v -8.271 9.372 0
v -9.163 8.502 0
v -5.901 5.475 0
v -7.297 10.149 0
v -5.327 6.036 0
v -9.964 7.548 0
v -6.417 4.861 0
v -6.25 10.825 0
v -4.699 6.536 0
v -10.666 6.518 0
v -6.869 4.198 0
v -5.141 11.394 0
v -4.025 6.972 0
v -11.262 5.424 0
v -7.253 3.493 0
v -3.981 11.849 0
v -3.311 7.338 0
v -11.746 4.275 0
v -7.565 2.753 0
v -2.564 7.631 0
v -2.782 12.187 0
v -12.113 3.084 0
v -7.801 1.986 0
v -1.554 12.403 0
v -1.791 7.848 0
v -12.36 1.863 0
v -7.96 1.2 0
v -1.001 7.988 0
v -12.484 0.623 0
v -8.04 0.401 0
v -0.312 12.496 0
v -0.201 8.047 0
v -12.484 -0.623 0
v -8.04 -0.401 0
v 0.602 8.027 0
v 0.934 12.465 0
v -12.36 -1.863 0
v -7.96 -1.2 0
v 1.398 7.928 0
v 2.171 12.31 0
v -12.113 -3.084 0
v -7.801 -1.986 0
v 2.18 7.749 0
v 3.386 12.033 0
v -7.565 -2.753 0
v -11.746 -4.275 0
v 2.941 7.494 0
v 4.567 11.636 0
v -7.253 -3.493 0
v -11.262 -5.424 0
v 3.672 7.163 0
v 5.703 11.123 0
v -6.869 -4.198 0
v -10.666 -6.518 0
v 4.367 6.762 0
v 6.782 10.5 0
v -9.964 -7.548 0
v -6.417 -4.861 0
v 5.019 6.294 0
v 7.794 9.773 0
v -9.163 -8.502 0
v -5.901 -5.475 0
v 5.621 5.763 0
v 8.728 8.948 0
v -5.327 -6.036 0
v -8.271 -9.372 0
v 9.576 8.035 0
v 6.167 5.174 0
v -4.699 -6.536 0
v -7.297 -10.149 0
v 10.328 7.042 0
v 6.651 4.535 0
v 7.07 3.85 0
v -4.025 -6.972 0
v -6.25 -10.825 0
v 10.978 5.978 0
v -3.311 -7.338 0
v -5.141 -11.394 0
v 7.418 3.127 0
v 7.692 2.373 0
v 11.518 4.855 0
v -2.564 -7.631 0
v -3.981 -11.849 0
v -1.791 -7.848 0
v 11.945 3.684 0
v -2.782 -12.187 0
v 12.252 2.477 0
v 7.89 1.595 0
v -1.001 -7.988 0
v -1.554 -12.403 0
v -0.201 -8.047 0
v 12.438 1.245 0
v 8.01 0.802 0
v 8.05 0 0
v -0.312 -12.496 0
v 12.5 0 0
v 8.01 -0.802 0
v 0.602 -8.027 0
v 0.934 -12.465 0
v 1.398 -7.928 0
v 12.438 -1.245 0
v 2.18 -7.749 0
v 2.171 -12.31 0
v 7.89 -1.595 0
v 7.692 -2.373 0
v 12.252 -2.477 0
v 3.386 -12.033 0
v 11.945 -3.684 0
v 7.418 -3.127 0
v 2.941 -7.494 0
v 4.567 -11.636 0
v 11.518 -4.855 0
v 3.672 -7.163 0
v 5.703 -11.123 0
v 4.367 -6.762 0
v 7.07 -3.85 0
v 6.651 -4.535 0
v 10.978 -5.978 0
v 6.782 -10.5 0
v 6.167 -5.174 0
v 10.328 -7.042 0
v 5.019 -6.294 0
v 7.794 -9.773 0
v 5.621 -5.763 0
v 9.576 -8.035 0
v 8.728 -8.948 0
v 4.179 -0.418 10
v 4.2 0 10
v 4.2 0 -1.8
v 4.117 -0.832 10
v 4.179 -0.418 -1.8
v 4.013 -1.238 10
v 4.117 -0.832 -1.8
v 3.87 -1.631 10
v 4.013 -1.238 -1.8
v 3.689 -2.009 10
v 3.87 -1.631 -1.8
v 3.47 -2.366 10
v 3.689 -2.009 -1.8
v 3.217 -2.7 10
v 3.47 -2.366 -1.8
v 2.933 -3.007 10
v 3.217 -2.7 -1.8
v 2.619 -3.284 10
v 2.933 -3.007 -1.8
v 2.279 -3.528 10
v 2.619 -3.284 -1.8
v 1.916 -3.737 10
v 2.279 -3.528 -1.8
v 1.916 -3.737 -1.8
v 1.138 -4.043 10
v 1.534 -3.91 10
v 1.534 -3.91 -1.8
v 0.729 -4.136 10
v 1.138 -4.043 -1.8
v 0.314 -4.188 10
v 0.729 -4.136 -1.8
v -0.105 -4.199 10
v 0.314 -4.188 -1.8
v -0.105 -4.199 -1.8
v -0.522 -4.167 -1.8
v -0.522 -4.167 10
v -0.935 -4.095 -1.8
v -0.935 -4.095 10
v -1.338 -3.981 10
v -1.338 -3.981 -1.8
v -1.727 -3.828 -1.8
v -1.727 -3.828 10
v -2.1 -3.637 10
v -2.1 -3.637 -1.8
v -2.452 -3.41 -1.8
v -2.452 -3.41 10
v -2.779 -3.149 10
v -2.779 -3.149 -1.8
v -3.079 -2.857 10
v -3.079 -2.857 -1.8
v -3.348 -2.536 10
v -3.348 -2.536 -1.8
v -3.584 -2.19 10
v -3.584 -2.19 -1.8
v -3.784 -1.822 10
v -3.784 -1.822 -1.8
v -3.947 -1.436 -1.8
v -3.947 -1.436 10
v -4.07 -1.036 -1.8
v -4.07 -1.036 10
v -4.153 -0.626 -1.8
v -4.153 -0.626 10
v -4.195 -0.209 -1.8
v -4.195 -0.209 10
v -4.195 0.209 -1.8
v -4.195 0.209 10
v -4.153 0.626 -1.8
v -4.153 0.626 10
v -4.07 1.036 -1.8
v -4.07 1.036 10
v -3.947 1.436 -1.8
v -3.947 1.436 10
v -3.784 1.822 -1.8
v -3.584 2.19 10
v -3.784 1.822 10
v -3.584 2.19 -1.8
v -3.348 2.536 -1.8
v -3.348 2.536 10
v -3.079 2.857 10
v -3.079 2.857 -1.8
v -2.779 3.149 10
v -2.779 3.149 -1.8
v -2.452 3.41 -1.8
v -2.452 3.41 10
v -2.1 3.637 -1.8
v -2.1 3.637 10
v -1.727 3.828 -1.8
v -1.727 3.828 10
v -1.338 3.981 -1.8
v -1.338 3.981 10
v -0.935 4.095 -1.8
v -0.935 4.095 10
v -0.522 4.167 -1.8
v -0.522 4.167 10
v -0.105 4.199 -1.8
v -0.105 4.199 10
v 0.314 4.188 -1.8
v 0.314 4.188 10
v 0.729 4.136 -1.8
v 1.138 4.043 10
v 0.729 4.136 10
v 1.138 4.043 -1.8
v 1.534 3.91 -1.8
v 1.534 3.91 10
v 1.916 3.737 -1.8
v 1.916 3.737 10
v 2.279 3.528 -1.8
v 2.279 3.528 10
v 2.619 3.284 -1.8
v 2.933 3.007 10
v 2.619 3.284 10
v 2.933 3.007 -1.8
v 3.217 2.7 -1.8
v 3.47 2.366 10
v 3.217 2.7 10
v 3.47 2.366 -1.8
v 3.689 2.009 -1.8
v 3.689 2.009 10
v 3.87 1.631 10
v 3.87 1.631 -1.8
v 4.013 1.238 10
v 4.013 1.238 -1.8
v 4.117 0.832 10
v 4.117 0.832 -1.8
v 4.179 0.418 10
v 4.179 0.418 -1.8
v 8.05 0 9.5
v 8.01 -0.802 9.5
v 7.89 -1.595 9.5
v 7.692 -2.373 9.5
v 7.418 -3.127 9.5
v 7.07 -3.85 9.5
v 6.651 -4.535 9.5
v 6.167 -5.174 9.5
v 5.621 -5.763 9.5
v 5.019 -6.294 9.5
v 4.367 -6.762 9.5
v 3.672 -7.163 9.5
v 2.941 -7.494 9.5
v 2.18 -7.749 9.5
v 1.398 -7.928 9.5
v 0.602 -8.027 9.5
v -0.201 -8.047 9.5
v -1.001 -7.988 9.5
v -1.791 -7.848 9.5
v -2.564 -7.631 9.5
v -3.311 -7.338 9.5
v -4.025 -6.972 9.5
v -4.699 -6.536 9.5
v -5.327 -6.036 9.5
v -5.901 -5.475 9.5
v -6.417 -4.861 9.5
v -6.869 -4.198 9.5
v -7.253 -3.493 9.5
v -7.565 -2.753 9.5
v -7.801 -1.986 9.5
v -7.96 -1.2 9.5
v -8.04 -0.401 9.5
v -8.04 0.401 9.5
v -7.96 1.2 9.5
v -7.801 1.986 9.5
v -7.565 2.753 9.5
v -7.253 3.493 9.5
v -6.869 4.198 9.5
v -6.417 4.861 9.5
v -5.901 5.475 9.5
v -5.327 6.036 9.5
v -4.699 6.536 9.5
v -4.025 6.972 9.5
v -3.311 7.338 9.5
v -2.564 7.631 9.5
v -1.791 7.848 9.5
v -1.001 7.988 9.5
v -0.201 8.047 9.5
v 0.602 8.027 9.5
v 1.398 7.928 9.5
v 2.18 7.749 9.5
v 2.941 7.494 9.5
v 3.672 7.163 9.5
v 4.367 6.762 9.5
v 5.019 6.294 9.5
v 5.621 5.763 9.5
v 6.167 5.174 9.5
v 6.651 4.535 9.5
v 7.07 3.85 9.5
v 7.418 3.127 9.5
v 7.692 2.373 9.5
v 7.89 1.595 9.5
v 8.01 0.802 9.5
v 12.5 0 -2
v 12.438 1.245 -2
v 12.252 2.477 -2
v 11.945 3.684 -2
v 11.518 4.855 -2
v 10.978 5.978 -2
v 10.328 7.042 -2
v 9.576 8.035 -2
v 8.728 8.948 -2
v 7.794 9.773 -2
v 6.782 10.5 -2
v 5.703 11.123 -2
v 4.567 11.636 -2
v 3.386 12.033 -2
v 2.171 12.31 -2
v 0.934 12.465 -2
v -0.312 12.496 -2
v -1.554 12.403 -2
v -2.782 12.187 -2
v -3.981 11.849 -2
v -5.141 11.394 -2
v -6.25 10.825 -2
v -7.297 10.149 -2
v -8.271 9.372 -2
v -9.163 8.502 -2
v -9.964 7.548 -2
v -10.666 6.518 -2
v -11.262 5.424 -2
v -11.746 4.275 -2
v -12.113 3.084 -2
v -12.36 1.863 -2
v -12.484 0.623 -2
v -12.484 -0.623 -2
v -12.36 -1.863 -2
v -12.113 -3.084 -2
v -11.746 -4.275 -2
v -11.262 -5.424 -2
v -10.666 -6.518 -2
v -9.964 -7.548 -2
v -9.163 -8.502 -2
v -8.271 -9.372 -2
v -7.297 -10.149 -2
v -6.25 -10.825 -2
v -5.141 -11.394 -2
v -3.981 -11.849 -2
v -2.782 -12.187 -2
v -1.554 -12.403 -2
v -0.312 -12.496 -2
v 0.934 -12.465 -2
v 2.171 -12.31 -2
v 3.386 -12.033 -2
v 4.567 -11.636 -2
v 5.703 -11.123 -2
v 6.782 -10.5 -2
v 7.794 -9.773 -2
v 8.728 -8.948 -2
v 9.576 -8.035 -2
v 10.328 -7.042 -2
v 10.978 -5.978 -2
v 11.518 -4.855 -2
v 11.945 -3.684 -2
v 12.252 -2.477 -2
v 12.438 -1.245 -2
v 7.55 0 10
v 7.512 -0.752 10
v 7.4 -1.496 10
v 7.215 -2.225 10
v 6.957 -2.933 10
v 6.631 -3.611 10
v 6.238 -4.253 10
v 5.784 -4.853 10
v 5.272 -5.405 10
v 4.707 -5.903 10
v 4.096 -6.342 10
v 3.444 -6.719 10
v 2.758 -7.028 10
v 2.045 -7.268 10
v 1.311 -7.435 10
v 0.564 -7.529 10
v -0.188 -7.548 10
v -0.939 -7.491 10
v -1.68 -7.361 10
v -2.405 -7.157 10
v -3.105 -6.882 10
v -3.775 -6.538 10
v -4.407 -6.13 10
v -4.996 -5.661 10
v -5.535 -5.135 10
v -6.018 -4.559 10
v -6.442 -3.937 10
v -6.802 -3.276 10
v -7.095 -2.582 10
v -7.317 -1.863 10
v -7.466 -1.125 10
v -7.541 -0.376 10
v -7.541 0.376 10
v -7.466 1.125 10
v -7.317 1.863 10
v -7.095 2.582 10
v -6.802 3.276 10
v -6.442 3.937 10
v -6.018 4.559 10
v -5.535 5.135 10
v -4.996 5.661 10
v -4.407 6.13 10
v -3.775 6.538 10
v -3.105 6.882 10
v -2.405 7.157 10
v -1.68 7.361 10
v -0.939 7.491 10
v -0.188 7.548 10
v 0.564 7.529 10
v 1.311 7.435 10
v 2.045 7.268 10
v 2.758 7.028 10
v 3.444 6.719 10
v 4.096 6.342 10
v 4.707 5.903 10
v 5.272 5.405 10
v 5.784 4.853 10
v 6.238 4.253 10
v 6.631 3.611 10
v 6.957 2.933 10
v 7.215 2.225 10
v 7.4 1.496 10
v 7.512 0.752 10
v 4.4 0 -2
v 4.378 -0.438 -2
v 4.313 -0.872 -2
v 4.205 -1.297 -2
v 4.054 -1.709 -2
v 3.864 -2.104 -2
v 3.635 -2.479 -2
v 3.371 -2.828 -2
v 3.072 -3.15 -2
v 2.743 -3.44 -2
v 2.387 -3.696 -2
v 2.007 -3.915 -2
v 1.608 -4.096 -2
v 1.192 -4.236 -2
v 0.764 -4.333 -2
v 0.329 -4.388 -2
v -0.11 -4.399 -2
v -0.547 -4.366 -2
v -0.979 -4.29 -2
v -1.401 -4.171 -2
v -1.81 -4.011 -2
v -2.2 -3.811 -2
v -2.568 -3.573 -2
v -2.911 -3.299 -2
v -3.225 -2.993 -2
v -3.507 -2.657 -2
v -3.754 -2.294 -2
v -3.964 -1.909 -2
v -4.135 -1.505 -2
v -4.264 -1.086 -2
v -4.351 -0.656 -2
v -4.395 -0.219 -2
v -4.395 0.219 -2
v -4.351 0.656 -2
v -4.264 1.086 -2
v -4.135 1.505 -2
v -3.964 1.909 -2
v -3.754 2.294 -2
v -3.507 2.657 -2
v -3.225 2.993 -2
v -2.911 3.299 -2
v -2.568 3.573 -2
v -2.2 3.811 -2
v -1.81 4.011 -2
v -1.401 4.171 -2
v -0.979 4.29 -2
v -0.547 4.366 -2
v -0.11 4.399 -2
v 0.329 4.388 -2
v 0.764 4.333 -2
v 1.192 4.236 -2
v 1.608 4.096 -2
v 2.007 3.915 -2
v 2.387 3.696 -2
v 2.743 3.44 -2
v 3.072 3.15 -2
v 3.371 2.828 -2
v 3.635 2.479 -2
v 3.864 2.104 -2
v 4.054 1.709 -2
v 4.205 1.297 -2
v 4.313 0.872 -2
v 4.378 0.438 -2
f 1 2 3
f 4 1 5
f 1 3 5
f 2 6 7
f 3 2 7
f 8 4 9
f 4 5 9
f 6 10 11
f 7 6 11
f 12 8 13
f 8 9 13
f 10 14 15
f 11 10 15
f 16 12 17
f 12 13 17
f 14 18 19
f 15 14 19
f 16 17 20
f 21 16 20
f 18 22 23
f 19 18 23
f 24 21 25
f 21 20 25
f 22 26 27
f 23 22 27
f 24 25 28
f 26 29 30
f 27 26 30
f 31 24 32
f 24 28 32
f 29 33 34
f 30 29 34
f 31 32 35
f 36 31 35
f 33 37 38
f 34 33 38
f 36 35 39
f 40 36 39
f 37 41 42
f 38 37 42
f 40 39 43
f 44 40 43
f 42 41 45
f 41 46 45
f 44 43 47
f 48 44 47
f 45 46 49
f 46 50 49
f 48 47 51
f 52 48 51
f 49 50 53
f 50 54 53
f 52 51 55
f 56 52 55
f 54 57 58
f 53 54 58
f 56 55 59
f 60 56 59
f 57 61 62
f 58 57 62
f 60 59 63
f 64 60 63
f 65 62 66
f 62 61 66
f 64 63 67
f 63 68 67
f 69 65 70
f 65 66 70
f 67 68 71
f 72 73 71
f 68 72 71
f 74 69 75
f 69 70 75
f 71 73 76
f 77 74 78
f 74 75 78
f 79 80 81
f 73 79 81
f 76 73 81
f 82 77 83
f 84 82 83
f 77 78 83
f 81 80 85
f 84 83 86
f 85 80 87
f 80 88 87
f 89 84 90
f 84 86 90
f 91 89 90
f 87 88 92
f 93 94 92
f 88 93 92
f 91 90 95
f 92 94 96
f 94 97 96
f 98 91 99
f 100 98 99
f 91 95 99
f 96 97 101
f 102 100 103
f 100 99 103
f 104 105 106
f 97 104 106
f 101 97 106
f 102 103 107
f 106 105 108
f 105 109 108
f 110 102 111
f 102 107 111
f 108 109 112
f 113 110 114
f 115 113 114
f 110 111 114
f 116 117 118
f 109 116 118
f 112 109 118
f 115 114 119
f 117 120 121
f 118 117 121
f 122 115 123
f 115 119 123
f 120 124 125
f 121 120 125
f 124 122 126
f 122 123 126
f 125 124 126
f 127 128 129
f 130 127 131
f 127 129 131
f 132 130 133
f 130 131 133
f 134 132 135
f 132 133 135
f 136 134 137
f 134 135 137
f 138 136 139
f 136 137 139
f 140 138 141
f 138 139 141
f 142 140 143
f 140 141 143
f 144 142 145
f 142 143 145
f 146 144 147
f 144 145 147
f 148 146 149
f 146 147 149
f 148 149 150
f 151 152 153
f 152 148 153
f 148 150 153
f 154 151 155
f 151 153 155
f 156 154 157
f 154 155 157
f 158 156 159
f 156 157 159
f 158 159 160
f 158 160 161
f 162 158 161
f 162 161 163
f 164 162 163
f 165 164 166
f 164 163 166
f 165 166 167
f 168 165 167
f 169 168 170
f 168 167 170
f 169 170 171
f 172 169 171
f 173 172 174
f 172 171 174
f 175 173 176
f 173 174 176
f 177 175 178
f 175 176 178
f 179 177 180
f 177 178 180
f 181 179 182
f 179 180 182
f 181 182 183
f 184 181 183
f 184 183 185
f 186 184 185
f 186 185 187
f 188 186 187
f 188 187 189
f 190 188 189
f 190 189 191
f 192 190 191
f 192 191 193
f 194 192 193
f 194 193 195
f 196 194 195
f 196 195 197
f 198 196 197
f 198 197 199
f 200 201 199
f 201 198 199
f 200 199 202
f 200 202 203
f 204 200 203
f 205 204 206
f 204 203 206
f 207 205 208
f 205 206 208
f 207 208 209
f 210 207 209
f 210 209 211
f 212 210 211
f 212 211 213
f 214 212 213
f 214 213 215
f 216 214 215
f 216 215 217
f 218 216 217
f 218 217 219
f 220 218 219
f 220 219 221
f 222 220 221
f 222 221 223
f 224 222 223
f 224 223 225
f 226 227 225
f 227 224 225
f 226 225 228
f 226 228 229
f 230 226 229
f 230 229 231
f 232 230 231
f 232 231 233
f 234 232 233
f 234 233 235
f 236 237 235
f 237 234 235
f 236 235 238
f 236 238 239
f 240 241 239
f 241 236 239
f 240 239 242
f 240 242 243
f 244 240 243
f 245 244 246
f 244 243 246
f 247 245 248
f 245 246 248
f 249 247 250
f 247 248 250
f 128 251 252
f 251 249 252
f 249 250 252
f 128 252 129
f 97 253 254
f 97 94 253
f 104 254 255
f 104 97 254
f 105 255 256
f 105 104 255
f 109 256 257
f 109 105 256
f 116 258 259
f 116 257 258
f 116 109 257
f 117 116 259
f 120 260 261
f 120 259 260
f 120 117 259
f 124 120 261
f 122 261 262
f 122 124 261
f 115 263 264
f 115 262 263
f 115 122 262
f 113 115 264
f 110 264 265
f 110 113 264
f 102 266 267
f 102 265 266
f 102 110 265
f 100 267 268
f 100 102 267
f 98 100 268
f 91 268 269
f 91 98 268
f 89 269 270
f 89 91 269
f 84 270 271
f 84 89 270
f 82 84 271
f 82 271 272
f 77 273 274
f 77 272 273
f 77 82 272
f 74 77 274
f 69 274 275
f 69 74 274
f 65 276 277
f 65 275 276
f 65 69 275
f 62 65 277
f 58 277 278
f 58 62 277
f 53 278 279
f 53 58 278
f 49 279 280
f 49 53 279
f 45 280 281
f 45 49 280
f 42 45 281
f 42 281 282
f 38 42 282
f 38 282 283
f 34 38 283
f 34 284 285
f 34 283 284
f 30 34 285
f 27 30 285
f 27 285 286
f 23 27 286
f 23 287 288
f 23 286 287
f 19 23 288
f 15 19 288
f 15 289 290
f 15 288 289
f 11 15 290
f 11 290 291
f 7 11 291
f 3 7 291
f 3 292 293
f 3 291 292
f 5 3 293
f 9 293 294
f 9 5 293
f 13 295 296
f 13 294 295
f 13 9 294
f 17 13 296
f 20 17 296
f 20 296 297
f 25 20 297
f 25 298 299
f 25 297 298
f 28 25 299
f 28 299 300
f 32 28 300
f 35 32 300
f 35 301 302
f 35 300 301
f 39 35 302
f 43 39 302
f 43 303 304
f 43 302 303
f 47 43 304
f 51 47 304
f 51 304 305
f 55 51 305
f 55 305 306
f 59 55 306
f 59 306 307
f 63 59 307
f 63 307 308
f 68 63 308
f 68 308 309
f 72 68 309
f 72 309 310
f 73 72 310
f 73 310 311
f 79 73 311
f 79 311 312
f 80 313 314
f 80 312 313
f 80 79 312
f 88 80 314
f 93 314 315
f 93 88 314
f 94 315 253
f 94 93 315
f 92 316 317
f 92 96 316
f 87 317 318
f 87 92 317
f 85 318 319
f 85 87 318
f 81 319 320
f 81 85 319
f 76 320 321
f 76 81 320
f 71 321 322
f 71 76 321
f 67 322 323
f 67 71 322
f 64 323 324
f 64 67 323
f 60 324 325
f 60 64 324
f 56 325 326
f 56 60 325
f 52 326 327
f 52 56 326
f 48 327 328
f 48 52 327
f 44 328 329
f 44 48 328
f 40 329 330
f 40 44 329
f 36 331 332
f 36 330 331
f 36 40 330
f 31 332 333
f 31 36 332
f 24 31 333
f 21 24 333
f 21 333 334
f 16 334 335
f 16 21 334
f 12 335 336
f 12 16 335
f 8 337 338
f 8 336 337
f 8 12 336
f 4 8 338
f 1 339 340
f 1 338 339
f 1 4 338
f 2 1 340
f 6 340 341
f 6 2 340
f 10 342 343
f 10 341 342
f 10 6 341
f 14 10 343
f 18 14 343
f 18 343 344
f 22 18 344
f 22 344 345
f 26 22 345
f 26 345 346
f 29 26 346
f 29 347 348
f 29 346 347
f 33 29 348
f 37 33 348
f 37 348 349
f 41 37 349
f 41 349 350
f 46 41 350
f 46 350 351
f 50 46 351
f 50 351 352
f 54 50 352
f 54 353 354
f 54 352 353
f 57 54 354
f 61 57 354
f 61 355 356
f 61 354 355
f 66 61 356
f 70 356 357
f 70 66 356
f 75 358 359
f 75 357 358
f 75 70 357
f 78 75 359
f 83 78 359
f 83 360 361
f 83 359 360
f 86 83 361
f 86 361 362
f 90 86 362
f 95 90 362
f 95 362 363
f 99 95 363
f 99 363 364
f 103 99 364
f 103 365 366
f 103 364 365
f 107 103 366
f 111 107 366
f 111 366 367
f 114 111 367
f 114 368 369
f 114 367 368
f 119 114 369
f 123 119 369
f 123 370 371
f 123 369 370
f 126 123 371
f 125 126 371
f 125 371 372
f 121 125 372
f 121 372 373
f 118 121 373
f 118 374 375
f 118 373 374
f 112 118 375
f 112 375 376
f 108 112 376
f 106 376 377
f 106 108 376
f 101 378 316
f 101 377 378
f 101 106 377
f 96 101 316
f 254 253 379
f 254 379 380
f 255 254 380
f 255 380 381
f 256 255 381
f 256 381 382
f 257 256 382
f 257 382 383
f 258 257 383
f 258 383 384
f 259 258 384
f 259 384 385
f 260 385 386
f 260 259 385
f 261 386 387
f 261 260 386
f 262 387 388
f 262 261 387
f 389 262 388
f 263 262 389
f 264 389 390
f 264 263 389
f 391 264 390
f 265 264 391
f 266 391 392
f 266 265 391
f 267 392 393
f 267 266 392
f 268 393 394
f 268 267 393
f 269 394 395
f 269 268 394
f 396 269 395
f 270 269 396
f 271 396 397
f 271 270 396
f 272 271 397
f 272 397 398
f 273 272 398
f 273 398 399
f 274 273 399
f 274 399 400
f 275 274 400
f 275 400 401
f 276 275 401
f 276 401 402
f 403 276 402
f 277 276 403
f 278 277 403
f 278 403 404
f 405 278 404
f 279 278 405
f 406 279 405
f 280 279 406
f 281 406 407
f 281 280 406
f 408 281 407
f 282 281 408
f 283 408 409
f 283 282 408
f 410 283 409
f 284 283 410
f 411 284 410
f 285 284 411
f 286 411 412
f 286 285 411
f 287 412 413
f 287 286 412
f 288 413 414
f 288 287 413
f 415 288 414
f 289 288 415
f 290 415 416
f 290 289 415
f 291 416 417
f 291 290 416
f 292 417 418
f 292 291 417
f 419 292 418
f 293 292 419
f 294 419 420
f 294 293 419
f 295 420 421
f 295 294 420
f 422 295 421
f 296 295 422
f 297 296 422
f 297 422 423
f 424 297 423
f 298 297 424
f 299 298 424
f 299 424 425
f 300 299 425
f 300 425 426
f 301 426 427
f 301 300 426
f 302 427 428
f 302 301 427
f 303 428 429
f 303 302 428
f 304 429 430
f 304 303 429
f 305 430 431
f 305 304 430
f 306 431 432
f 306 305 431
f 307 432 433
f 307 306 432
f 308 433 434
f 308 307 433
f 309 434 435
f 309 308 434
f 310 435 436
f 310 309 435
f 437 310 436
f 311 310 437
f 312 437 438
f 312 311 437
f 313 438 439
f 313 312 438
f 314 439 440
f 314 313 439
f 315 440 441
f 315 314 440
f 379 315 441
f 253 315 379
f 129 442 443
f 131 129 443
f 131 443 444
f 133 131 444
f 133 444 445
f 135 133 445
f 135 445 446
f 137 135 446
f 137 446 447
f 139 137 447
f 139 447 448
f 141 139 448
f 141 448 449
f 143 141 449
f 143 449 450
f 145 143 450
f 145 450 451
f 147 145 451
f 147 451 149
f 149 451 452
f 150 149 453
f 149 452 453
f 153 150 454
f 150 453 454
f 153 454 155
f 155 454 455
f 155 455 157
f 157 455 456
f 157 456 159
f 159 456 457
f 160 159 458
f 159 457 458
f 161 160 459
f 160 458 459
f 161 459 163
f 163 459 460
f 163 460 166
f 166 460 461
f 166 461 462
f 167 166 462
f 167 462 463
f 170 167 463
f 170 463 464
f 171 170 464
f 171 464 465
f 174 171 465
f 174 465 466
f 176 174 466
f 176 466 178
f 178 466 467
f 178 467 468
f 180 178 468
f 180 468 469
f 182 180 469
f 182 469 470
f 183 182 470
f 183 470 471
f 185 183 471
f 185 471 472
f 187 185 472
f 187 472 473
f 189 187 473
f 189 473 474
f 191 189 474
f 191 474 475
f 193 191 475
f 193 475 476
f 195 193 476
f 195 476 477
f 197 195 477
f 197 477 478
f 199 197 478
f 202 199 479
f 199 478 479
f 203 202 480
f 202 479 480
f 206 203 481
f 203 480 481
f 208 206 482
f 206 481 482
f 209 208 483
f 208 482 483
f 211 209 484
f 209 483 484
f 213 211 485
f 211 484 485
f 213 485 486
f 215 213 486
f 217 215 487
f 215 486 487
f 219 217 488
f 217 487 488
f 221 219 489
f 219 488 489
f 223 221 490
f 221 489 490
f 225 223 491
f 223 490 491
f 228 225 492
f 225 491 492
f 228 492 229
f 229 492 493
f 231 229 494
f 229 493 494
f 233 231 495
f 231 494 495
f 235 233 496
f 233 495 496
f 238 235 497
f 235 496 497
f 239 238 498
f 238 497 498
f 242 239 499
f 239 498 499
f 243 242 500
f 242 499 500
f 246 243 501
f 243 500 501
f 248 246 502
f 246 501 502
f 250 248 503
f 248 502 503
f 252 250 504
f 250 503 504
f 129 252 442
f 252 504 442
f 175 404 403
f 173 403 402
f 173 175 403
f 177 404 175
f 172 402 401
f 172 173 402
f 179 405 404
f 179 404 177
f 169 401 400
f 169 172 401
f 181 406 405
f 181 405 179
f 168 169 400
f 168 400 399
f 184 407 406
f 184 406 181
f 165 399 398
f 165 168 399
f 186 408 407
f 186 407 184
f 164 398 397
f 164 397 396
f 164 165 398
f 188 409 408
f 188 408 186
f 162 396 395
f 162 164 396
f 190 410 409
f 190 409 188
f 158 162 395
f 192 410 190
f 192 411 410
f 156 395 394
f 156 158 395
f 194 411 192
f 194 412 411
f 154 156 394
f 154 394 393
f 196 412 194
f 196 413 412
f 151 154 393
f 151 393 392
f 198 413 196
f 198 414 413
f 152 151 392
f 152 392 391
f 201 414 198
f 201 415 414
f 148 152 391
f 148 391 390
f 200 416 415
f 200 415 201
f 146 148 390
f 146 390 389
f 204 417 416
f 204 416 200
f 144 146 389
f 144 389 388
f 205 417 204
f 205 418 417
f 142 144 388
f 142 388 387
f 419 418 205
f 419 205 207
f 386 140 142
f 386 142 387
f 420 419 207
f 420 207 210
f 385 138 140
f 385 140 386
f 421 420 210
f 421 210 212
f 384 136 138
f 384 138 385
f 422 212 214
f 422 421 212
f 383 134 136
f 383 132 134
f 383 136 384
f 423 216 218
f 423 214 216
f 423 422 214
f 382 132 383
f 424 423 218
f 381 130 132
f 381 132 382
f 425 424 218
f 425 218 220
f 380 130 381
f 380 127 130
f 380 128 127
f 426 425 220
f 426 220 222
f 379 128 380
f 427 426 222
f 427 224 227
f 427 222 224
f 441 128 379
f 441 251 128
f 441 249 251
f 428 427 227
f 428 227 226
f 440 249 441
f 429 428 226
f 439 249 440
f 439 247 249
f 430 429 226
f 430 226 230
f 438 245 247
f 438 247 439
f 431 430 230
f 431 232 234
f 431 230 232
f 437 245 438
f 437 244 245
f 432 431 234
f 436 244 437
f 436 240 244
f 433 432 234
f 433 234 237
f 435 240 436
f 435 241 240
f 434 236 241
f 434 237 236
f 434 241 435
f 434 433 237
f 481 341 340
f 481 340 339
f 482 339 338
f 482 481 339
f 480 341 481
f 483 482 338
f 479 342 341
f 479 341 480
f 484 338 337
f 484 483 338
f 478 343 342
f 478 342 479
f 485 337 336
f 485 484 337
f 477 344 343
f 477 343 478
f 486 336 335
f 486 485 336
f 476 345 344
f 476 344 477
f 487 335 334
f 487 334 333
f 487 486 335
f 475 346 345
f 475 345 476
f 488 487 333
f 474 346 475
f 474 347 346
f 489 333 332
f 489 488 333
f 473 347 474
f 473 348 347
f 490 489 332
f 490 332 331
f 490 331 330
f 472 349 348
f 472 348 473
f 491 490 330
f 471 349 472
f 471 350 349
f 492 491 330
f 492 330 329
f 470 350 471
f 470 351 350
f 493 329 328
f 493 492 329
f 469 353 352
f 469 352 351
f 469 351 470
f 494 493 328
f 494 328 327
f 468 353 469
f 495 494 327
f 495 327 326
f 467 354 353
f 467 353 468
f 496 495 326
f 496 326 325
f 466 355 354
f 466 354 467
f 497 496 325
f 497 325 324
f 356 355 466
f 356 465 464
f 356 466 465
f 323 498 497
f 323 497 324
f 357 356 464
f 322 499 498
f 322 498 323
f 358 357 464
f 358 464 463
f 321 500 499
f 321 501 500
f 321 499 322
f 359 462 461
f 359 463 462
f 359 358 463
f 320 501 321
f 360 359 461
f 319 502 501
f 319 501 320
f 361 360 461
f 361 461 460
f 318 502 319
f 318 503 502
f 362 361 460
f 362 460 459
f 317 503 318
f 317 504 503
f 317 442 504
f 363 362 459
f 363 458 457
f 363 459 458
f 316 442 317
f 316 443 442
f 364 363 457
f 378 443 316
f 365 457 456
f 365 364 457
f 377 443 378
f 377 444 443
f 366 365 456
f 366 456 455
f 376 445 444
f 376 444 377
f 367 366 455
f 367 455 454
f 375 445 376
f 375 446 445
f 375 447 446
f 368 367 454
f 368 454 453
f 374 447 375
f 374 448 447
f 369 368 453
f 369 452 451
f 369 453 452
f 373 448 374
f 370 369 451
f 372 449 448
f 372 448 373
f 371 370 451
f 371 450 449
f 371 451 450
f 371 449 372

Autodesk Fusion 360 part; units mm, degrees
sketch "Esquisse1" plane through (0, 0, 0) normal (0, 0, 1) x (1, 0, 0)
  circle A0 centre (0, 0) radius 8.05
  circle A1 centre (0, 0) radius 4.2
  dimension "d1" = 16.1
  dimension "d2" = 8.4
extrude "Extrusion1" add sketch "Esquisse1" along normal blind 10
sketch "Esquisse2" plane through (0, 0, 0) normal (0, 0, -1) x (1, 0, 0)
  circle A0 centre (0, 0) radius 4.2
  circle A1 centre (0, 0) radius 8.05
  circle A2 centre (0, 0) radius 12.5
  dimension "d5" = 25
extrude "Extrusion2" add sketch "Esquisse2" along normal blind 2 contours A1 | A2
chamfer "Chanfrein1" distance 0.5 angle 45 1 edges at (-7.5052, -2.911, 10)
chamfer "Chanfrein2" distance 0.2 angle 45 1 edges at (-3.9158, -1.5188, -2)
sketch "Esquisse3" plane through (0, 0, -2) normal (0, 0, -1) x (1, 0, 0)
  circle A0 centre (0, 0) radius 12.5
  circle A1 centre (0, 0) radius 4.4
